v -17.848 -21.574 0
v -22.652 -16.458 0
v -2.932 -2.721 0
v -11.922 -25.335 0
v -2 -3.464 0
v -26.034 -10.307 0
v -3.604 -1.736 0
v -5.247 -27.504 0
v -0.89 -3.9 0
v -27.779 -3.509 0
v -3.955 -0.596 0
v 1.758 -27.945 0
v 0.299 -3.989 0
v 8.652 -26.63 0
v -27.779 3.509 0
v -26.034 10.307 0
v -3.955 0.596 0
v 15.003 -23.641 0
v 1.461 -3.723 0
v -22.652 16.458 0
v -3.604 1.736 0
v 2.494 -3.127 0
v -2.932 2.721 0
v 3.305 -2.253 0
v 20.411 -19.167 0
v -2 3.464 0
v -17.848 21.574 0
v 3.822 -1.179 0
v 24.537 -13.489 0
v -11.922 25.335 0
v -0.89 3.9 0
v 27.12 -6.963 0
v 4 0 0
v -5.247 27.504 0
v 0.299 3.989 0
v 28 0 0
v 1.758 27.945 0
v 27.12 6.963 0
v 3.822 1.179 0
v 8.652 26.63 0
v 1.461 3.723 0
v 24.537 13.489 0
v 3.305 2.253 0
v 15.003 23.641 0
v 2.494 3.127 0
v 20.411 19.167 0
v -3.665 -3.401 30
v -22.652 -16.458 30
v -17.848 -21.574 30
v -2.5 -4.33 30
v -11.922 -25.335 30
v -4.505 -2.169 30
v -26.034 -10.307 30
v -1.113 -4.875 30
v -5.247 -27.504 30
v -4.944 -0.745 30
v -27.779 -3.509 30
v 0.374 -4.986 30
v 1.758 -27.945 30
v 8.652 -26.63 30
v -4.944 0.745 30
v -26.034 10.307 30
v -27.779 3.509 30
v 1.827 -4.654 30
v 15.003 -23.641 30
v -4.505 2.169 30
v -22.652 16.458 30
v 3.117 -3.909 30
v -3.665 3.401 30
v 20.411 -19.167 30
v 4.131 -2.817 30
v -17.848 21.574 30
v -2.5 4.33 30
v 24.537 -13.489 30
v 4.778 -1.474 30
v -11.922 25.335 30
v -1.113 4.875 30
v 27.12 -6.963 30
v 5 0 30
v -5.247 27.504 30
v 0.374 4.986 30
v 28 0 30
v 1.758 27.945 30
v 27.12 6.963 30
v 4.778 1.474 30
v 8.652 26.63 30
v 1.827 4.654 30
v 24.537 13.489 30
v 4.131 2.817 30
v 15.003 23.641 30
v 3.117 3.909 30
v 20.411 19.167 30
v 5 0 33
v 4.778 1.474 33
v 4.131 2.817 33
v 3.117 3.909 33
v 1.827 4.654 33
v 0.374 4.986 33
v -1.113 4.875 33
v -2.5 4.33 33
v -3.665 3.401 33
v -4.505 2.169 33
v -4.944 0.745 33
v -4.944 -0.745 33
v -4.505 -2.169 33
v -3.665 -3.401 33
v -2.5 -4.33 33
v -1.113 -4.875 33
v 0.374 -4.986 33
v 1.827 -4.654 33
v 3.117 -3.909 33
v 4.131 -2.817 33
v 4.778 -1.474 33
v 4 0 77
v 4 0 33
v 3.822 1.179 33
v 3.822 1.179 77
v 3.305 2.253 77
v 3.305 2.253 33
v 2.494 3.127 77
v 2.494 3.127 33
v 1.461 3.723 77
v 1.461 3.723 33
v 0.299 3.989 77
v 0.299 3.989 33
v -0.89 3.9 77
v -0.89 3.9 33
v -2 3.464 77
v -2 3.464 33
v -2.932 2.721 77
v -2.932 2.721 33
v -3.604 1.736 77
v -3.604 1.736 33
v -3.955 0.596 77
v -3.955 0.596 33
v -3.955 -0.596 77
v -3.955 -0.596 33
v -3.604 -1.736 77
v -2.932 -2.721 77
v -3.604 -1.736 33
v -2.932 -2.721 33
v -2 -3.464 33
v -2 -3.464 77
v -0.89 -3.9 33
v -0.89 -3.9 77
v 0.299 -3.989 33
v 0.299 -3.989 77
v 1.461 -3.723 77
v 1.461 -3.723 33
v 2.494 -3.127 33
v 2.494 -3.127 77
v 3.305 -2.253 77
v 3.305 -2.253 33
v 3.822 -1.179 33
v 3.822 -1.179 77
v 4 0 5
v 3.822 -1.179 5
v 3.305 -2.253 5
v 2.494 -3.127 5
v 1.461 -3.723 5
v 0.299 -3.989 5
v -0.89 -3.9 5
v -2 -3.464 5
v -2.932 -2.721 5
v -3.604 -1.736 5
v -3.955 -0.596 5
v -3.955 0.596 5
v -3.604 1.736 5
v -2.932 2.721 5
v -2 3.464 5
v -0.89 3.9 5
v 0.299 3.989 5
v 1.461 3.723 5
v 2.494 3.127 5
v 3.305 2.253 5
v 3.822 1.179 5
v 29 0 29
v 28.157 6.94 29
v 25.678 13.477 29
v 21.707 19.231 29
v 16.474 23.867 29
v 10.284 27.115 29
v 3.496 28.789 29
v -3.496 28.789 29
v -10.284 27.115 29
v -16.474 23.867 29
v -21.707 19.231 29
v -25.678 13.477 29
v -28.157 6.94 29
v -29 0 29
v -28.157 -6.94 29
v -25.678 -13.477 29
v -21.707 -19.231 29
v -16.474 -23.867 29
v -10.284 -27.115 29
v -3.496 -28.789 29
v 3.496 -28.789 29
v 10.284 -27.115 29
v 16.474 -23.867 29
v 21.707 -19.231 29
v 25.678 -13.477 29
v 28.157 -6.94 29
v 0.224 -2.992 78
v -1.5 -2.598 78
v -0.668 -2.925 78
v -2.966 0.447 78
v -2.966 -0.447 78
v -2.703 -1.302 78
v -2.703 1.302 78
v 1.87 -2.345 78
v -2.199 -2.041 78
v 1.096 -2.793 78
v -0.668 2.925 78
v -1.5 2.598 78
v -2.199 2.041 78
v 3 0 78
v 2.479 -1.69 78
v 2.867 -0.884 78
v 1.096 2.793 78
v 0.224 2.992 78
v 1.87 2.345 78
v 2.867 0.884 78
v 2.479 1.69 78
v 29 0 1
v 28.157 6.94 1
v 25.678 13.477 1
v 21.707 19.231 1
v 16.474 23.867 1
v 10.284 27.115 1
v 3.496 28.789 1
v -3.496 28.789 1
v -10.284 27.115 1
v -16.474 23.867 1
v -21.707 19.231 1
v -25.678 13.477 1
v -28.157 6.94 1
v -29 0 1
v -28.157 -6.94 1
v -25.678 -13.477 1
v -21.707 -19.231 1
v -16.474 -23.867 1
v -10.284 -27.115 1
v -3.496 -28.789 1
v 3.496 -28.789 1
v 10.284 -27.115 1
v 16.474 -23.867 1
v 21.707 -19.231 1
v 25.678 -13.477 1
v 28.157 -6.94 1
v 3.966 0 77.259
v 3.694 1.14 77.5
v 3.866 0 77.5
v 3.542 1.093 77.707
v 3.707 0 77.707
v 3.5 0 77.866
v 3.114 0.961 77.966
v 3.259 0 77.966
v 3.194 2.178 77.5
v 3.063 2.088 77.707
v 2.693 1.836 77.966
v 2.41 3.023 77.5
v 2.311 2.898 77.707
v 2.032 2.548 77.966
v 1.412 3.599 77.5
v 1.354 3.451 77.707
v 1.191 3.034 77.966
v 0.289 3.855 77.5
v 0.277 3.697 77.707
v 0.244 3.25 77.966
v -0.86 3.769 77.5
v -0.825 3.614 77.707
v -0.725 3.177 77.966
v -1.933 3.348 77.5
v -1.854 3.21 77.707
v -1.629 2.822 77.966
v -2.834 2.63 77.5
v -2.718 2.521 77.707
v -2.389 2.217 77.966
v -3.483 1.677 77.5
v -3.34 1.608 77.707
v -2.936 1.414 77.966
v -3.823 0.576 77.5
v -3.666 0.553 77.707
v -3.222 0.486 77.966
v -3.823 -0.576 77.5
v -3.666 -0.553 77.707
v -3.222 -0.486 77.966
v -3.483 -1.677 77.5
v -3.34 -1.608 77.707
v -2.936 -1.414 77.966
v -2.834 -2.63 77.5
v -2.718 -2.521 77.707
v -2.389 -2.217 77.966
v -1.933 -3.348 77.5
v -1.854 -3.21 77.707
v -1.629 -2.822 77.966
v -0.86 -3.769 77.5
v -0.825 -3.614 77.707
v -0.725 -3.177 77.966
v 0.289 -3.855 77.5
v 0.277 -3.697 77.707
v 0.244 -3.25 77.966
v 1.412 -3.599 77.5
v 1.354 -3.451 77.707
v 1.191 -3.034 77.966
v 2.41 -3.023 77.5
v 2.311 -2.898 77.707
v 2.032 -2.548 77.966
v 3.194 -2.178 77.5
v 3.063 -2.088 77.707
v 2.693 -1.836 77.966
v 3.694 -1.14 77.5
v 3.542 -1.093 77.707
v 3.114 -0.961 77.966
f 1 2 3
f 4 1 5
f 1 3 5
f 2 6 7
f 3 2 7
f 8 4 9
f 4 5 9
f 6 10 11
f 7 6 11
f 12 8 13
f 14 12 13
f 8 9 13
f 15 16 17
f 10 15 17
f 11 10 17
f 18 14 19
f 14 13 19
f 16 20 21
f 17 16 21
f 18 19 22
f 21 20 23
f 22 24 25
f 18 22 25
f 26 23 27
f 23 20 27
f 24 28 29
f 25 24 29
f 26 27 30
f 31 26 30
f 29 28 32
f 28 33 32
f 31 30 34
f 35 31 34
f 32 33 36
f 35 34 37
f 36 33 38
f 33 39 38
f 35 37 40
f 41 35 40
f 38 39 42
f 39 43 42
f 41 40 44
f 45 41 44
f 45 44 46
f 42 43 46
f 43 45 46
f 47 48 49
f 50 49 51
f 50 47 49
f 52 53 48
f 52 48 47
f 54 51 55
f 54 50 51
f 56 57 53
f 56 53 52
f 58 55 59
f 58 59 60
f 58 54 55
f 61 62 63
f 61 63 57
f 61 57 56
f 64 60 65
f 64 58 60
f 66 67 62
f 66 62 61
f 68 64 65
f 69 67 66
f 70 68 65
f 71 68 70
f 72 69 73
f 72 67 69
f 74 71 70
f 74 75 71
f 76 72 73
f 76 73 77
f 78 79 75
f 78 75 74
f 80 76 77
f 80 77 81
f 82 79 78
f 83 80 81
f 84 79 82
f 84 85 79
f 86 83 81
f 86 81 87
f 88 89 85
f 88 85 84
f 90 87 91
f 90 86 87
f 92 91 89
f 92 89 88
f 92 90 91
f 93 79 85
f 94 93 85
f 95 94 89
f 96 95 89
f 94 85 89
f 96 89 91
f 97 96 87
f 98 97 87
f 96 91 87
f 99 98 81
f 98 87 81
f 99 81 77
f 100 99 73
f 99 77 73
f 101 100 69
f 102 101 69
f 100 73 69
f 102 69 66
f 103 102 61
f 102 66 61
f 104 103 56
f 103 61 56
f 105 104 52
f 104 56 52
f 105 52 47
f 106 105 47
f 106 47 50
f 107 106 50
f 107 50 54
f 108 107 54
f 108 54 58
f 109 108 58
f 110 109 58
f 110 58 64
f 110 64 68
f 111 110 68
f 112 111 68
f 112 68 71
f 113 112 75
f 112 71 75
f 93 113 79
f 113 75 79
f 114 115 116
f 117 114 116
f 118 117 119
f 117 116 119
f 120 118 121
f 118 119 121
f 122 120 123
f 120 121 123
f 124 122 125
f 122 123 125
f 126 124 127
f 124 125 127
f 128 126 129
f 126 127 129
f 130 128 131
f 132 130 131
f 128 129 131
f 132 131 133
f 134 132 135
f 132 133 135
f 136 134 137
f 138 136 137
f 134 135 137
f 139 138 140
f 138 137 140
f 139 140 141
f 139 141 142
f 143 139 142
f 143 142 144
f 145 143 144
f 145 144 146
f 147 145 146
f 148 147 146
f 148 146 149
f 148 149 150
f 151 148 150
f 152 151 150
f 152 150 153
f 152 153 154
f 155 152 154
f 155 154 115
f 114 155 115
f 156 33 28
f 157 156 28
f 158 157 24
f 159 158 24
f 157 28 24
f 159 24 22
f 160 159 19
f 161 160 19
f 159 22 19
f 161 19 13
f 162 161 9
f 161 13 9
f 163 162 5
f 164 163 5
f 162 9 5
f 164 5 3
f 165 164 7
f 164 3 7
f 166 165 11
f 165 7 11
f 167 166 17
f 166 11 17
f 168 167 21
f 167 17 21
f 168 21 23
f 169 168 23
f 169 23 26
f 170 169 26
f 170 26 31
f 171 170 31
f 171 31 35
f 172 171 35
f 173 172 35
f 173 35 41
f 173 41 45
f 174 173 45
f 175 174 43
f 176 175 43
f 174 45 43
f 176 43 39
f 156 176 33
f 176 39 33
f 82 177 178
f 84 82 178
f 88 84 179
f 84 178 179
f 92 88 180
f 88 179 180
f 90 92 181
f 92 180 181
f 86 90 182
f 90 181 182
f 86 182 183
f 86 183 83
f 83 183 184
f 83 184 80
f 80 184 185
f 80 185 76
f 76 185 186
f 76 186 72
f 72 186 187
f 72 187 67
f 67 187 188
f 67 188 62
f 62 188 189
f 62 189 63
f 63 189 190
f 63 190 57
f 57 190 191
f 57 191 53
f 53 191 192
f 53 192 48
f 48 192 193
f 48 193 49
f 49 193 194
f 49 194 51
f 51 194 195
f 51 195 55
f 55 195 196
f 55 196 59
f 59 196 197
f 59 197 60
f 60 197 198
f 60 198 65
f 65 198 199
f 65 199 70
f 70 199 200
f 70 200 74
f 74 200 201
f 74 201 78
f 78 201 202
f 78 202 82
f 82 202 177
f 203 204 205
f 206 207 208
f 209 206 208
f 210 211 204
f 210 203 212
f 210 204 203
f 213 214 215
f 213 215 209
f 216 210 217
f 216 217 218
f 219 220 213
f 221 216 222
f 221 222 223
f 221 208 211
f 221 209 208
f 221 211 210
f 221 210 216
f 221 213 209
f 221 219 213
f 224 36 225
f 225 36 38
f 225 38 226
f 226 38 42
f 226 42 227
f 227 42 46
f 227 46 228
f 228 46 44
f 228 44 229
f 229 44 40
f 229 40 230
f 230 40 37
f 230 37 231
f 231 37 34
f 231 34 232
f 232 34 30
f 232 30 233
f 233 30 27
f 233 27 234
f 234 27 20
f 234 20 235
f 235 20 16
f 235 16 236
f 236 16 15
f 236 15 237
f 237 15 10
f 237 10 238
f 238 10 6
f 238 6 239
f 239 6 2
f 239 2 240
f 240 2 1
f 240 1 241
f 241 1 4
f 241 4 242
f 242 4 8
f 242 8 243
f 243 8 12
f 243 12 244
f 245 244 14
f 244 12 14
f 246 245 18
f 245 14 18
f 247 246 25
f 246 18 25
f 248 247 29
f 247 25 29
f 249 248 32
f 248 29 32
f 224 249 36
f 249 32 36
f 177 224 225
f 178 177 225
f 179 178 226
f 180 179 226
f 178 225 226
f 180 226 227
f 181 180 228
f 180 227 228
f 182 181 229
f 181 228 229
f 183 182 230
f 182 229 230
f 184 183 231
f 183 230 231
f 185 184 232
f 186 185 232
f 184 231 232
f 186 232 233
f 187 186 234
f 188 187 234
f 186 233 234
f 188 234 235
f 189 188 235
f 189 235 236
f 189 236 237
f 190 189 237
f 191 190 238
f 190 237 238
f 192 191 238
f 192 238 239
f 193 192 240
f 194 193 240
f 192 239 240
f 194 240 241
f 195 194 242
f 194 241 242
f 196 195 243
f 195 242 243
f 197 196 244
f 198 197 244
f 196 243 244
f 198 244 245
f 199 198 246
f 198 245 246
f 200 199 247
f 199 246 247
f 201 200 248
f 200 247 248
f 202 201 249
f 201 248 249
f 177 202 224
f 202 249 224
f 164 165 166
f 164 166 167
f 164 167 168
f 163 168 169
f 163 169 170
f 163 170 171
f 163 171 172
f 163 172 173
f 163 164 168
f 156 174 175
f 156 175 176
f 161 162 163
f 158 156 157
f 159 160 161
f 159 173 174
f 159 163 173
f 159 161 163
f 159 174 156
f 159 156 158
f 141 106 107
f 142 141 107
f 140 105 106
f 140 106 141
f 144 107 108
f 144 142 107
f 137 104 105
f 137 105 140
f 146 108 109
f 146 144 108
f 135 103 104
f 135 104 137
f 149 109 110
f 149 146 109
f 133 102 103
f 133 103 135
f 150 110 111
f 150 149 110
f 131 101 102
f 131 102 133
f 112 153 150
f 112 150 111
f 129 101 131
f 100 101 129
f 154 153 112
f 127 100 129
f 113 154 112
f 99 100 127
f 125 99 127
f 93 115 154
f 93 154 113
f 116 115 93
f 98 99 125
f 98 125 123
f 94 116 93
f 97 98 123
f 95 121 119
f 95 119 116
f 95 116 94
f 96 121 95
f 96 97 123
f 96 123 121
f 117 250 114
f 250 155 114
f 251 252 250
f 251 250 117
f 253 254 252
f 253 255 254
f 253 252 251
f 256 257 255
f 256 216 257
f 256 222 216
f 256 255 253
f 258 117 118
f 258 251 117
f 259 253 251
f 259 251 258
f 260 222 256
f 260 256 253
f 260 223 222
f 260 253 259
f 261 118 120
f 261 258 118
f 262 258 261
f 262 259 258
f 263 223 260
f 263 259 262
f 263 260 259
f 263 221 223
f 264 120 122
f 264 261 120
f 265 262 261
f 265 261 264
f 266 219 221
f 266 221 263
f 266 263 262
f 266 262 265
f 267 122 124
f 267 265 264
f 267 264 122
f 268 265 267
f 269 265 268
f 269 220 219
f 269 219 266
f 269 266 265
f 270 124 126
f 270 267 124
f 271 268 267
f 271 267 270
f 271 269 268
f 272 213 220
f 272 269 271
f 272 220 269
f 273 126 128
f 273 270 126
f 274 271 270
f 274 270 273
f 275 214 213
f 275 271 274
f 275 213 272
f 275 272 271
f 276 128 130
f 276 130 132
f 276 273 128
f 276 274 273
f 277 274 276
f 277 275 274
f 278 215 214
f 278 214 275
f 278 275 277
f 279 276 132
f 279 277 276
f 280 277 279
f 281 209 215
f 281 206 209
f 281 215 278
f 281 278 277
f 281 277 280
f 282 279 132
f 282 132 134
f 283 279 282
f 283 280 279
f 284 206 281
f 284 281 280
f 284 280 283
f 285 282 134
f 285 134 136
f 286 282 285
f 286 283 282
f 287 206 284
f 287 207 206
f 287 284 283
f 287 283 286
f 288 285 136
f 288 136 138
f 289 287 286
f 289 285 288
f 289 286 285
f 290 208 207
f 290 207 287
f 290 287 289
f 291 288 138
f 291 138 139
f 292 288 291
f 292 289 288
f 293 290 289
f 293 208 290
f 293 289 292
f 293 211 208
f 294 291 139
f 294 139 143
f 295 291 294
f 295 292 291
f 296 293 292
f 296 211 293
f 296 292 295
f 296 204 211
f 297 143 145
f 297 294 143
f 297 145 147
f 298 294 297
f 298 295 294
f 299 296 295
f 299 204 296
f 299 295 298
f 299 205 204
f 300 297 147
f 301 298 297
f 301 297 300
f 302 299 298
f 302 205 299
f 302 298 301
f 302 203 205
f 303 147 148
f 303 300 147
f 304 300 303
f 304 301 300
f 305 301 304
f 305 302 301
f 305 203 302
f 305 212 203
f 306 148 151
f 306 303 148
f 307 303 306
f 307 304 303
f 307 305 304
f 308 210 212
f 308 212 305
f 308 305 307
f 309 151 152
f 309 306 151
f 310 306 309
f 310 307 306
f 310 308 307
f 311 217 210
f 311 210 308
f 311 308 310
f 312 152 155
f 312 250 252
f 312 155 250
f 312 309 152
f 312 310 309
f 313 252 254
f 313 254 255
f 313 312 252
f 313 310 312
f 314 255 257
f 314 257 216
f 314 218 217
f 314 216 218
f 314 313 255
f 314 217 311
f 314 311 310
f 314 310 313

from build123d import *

# Parameters (mm, degrees)
ESQUISSE1_R             = 29
BOSS_EXTRU_1_DEPTH      = 30
ESQUISSE2_R             = 4
BOSS_EXTRU_2_DEPTH      = 10
ESQUISSE3_R             = 5
BOSS_EXTRU_3_DEPTH      = 3
ESQUISSE4_R             = 4
ENL_V_MAT_EXTRU_1_DEPTH = 5
CHANFREIN1_SIZE         = 1
ESQUISSE8_R             = 4
BOSS_EXTRU_4_DEPTH      = 38
CONG_1_R                = 1


with BuildPart() as part:
    # Esquisse1 → Boss.-Extru.1 (new body)
    with BuildSketch(Plane.XY):
        Circle(ESQUISSE1_R)
    extrude(amount=BOSS_EXTRU_1_DEPTH)

    # Esquisse2 → Boss.-Extru.2 (add)
    with BuildSketch(Plane.XY.offset(30)):
        Circle(ESQUISSE2_R)
    extrude(amount=BOSS_EXTRU_2_DEPTH)

    # Esquisse3 → Boss.-Extru.3 (add)
    with BuildSketch(Plane.XY.offset(30)):
        Circle(ESQUISSE3_R)
    extrude(amount=BOSS_EXTRU_3_DEPTH)

    # Esquisse4 → Enlèv. mat.-Extru.1 (cut)
    with BuildSketch(Plane(origin=(0, 0, 0), x_dir=(-1, 0, 0), z_dir=(0, 0, -1))):
        with Locations(Location((0, 0, 0), (0, 0, 180))):
            Circle(ESQUISSE4_R)
    extrude(amount=-ENL_V_MAT_EXTRU_1_DEPTH, mode=Mode.SUBTRACT)

    # Chanfrein1
    chanfrein1_edges = [part.edges().sort_by_distance(p)[0] for p in [
        (-29, 0, 0),
        (-29, 0, 30),
    ]]
    chamfer(chanfrein1_edges, length=CHANFREIN1_SIZE)

    # Esquisse8 → Boss.-Extru.4 (add)
    with BuildSketch(Plane.XY.offset(40)):
        Circle(ESQUISSE8_R)
    extrude(amount=BOSS_EXTRU_4_DEPTH)

    # Congé1
    cong_1_edges = [part.edges().sort_by_distance(p)[0] for p in [
        (-4, 0, 78),
    ]]
    fillet(cong_1_edges, radius=CONG_1_R)


solid = part.part
